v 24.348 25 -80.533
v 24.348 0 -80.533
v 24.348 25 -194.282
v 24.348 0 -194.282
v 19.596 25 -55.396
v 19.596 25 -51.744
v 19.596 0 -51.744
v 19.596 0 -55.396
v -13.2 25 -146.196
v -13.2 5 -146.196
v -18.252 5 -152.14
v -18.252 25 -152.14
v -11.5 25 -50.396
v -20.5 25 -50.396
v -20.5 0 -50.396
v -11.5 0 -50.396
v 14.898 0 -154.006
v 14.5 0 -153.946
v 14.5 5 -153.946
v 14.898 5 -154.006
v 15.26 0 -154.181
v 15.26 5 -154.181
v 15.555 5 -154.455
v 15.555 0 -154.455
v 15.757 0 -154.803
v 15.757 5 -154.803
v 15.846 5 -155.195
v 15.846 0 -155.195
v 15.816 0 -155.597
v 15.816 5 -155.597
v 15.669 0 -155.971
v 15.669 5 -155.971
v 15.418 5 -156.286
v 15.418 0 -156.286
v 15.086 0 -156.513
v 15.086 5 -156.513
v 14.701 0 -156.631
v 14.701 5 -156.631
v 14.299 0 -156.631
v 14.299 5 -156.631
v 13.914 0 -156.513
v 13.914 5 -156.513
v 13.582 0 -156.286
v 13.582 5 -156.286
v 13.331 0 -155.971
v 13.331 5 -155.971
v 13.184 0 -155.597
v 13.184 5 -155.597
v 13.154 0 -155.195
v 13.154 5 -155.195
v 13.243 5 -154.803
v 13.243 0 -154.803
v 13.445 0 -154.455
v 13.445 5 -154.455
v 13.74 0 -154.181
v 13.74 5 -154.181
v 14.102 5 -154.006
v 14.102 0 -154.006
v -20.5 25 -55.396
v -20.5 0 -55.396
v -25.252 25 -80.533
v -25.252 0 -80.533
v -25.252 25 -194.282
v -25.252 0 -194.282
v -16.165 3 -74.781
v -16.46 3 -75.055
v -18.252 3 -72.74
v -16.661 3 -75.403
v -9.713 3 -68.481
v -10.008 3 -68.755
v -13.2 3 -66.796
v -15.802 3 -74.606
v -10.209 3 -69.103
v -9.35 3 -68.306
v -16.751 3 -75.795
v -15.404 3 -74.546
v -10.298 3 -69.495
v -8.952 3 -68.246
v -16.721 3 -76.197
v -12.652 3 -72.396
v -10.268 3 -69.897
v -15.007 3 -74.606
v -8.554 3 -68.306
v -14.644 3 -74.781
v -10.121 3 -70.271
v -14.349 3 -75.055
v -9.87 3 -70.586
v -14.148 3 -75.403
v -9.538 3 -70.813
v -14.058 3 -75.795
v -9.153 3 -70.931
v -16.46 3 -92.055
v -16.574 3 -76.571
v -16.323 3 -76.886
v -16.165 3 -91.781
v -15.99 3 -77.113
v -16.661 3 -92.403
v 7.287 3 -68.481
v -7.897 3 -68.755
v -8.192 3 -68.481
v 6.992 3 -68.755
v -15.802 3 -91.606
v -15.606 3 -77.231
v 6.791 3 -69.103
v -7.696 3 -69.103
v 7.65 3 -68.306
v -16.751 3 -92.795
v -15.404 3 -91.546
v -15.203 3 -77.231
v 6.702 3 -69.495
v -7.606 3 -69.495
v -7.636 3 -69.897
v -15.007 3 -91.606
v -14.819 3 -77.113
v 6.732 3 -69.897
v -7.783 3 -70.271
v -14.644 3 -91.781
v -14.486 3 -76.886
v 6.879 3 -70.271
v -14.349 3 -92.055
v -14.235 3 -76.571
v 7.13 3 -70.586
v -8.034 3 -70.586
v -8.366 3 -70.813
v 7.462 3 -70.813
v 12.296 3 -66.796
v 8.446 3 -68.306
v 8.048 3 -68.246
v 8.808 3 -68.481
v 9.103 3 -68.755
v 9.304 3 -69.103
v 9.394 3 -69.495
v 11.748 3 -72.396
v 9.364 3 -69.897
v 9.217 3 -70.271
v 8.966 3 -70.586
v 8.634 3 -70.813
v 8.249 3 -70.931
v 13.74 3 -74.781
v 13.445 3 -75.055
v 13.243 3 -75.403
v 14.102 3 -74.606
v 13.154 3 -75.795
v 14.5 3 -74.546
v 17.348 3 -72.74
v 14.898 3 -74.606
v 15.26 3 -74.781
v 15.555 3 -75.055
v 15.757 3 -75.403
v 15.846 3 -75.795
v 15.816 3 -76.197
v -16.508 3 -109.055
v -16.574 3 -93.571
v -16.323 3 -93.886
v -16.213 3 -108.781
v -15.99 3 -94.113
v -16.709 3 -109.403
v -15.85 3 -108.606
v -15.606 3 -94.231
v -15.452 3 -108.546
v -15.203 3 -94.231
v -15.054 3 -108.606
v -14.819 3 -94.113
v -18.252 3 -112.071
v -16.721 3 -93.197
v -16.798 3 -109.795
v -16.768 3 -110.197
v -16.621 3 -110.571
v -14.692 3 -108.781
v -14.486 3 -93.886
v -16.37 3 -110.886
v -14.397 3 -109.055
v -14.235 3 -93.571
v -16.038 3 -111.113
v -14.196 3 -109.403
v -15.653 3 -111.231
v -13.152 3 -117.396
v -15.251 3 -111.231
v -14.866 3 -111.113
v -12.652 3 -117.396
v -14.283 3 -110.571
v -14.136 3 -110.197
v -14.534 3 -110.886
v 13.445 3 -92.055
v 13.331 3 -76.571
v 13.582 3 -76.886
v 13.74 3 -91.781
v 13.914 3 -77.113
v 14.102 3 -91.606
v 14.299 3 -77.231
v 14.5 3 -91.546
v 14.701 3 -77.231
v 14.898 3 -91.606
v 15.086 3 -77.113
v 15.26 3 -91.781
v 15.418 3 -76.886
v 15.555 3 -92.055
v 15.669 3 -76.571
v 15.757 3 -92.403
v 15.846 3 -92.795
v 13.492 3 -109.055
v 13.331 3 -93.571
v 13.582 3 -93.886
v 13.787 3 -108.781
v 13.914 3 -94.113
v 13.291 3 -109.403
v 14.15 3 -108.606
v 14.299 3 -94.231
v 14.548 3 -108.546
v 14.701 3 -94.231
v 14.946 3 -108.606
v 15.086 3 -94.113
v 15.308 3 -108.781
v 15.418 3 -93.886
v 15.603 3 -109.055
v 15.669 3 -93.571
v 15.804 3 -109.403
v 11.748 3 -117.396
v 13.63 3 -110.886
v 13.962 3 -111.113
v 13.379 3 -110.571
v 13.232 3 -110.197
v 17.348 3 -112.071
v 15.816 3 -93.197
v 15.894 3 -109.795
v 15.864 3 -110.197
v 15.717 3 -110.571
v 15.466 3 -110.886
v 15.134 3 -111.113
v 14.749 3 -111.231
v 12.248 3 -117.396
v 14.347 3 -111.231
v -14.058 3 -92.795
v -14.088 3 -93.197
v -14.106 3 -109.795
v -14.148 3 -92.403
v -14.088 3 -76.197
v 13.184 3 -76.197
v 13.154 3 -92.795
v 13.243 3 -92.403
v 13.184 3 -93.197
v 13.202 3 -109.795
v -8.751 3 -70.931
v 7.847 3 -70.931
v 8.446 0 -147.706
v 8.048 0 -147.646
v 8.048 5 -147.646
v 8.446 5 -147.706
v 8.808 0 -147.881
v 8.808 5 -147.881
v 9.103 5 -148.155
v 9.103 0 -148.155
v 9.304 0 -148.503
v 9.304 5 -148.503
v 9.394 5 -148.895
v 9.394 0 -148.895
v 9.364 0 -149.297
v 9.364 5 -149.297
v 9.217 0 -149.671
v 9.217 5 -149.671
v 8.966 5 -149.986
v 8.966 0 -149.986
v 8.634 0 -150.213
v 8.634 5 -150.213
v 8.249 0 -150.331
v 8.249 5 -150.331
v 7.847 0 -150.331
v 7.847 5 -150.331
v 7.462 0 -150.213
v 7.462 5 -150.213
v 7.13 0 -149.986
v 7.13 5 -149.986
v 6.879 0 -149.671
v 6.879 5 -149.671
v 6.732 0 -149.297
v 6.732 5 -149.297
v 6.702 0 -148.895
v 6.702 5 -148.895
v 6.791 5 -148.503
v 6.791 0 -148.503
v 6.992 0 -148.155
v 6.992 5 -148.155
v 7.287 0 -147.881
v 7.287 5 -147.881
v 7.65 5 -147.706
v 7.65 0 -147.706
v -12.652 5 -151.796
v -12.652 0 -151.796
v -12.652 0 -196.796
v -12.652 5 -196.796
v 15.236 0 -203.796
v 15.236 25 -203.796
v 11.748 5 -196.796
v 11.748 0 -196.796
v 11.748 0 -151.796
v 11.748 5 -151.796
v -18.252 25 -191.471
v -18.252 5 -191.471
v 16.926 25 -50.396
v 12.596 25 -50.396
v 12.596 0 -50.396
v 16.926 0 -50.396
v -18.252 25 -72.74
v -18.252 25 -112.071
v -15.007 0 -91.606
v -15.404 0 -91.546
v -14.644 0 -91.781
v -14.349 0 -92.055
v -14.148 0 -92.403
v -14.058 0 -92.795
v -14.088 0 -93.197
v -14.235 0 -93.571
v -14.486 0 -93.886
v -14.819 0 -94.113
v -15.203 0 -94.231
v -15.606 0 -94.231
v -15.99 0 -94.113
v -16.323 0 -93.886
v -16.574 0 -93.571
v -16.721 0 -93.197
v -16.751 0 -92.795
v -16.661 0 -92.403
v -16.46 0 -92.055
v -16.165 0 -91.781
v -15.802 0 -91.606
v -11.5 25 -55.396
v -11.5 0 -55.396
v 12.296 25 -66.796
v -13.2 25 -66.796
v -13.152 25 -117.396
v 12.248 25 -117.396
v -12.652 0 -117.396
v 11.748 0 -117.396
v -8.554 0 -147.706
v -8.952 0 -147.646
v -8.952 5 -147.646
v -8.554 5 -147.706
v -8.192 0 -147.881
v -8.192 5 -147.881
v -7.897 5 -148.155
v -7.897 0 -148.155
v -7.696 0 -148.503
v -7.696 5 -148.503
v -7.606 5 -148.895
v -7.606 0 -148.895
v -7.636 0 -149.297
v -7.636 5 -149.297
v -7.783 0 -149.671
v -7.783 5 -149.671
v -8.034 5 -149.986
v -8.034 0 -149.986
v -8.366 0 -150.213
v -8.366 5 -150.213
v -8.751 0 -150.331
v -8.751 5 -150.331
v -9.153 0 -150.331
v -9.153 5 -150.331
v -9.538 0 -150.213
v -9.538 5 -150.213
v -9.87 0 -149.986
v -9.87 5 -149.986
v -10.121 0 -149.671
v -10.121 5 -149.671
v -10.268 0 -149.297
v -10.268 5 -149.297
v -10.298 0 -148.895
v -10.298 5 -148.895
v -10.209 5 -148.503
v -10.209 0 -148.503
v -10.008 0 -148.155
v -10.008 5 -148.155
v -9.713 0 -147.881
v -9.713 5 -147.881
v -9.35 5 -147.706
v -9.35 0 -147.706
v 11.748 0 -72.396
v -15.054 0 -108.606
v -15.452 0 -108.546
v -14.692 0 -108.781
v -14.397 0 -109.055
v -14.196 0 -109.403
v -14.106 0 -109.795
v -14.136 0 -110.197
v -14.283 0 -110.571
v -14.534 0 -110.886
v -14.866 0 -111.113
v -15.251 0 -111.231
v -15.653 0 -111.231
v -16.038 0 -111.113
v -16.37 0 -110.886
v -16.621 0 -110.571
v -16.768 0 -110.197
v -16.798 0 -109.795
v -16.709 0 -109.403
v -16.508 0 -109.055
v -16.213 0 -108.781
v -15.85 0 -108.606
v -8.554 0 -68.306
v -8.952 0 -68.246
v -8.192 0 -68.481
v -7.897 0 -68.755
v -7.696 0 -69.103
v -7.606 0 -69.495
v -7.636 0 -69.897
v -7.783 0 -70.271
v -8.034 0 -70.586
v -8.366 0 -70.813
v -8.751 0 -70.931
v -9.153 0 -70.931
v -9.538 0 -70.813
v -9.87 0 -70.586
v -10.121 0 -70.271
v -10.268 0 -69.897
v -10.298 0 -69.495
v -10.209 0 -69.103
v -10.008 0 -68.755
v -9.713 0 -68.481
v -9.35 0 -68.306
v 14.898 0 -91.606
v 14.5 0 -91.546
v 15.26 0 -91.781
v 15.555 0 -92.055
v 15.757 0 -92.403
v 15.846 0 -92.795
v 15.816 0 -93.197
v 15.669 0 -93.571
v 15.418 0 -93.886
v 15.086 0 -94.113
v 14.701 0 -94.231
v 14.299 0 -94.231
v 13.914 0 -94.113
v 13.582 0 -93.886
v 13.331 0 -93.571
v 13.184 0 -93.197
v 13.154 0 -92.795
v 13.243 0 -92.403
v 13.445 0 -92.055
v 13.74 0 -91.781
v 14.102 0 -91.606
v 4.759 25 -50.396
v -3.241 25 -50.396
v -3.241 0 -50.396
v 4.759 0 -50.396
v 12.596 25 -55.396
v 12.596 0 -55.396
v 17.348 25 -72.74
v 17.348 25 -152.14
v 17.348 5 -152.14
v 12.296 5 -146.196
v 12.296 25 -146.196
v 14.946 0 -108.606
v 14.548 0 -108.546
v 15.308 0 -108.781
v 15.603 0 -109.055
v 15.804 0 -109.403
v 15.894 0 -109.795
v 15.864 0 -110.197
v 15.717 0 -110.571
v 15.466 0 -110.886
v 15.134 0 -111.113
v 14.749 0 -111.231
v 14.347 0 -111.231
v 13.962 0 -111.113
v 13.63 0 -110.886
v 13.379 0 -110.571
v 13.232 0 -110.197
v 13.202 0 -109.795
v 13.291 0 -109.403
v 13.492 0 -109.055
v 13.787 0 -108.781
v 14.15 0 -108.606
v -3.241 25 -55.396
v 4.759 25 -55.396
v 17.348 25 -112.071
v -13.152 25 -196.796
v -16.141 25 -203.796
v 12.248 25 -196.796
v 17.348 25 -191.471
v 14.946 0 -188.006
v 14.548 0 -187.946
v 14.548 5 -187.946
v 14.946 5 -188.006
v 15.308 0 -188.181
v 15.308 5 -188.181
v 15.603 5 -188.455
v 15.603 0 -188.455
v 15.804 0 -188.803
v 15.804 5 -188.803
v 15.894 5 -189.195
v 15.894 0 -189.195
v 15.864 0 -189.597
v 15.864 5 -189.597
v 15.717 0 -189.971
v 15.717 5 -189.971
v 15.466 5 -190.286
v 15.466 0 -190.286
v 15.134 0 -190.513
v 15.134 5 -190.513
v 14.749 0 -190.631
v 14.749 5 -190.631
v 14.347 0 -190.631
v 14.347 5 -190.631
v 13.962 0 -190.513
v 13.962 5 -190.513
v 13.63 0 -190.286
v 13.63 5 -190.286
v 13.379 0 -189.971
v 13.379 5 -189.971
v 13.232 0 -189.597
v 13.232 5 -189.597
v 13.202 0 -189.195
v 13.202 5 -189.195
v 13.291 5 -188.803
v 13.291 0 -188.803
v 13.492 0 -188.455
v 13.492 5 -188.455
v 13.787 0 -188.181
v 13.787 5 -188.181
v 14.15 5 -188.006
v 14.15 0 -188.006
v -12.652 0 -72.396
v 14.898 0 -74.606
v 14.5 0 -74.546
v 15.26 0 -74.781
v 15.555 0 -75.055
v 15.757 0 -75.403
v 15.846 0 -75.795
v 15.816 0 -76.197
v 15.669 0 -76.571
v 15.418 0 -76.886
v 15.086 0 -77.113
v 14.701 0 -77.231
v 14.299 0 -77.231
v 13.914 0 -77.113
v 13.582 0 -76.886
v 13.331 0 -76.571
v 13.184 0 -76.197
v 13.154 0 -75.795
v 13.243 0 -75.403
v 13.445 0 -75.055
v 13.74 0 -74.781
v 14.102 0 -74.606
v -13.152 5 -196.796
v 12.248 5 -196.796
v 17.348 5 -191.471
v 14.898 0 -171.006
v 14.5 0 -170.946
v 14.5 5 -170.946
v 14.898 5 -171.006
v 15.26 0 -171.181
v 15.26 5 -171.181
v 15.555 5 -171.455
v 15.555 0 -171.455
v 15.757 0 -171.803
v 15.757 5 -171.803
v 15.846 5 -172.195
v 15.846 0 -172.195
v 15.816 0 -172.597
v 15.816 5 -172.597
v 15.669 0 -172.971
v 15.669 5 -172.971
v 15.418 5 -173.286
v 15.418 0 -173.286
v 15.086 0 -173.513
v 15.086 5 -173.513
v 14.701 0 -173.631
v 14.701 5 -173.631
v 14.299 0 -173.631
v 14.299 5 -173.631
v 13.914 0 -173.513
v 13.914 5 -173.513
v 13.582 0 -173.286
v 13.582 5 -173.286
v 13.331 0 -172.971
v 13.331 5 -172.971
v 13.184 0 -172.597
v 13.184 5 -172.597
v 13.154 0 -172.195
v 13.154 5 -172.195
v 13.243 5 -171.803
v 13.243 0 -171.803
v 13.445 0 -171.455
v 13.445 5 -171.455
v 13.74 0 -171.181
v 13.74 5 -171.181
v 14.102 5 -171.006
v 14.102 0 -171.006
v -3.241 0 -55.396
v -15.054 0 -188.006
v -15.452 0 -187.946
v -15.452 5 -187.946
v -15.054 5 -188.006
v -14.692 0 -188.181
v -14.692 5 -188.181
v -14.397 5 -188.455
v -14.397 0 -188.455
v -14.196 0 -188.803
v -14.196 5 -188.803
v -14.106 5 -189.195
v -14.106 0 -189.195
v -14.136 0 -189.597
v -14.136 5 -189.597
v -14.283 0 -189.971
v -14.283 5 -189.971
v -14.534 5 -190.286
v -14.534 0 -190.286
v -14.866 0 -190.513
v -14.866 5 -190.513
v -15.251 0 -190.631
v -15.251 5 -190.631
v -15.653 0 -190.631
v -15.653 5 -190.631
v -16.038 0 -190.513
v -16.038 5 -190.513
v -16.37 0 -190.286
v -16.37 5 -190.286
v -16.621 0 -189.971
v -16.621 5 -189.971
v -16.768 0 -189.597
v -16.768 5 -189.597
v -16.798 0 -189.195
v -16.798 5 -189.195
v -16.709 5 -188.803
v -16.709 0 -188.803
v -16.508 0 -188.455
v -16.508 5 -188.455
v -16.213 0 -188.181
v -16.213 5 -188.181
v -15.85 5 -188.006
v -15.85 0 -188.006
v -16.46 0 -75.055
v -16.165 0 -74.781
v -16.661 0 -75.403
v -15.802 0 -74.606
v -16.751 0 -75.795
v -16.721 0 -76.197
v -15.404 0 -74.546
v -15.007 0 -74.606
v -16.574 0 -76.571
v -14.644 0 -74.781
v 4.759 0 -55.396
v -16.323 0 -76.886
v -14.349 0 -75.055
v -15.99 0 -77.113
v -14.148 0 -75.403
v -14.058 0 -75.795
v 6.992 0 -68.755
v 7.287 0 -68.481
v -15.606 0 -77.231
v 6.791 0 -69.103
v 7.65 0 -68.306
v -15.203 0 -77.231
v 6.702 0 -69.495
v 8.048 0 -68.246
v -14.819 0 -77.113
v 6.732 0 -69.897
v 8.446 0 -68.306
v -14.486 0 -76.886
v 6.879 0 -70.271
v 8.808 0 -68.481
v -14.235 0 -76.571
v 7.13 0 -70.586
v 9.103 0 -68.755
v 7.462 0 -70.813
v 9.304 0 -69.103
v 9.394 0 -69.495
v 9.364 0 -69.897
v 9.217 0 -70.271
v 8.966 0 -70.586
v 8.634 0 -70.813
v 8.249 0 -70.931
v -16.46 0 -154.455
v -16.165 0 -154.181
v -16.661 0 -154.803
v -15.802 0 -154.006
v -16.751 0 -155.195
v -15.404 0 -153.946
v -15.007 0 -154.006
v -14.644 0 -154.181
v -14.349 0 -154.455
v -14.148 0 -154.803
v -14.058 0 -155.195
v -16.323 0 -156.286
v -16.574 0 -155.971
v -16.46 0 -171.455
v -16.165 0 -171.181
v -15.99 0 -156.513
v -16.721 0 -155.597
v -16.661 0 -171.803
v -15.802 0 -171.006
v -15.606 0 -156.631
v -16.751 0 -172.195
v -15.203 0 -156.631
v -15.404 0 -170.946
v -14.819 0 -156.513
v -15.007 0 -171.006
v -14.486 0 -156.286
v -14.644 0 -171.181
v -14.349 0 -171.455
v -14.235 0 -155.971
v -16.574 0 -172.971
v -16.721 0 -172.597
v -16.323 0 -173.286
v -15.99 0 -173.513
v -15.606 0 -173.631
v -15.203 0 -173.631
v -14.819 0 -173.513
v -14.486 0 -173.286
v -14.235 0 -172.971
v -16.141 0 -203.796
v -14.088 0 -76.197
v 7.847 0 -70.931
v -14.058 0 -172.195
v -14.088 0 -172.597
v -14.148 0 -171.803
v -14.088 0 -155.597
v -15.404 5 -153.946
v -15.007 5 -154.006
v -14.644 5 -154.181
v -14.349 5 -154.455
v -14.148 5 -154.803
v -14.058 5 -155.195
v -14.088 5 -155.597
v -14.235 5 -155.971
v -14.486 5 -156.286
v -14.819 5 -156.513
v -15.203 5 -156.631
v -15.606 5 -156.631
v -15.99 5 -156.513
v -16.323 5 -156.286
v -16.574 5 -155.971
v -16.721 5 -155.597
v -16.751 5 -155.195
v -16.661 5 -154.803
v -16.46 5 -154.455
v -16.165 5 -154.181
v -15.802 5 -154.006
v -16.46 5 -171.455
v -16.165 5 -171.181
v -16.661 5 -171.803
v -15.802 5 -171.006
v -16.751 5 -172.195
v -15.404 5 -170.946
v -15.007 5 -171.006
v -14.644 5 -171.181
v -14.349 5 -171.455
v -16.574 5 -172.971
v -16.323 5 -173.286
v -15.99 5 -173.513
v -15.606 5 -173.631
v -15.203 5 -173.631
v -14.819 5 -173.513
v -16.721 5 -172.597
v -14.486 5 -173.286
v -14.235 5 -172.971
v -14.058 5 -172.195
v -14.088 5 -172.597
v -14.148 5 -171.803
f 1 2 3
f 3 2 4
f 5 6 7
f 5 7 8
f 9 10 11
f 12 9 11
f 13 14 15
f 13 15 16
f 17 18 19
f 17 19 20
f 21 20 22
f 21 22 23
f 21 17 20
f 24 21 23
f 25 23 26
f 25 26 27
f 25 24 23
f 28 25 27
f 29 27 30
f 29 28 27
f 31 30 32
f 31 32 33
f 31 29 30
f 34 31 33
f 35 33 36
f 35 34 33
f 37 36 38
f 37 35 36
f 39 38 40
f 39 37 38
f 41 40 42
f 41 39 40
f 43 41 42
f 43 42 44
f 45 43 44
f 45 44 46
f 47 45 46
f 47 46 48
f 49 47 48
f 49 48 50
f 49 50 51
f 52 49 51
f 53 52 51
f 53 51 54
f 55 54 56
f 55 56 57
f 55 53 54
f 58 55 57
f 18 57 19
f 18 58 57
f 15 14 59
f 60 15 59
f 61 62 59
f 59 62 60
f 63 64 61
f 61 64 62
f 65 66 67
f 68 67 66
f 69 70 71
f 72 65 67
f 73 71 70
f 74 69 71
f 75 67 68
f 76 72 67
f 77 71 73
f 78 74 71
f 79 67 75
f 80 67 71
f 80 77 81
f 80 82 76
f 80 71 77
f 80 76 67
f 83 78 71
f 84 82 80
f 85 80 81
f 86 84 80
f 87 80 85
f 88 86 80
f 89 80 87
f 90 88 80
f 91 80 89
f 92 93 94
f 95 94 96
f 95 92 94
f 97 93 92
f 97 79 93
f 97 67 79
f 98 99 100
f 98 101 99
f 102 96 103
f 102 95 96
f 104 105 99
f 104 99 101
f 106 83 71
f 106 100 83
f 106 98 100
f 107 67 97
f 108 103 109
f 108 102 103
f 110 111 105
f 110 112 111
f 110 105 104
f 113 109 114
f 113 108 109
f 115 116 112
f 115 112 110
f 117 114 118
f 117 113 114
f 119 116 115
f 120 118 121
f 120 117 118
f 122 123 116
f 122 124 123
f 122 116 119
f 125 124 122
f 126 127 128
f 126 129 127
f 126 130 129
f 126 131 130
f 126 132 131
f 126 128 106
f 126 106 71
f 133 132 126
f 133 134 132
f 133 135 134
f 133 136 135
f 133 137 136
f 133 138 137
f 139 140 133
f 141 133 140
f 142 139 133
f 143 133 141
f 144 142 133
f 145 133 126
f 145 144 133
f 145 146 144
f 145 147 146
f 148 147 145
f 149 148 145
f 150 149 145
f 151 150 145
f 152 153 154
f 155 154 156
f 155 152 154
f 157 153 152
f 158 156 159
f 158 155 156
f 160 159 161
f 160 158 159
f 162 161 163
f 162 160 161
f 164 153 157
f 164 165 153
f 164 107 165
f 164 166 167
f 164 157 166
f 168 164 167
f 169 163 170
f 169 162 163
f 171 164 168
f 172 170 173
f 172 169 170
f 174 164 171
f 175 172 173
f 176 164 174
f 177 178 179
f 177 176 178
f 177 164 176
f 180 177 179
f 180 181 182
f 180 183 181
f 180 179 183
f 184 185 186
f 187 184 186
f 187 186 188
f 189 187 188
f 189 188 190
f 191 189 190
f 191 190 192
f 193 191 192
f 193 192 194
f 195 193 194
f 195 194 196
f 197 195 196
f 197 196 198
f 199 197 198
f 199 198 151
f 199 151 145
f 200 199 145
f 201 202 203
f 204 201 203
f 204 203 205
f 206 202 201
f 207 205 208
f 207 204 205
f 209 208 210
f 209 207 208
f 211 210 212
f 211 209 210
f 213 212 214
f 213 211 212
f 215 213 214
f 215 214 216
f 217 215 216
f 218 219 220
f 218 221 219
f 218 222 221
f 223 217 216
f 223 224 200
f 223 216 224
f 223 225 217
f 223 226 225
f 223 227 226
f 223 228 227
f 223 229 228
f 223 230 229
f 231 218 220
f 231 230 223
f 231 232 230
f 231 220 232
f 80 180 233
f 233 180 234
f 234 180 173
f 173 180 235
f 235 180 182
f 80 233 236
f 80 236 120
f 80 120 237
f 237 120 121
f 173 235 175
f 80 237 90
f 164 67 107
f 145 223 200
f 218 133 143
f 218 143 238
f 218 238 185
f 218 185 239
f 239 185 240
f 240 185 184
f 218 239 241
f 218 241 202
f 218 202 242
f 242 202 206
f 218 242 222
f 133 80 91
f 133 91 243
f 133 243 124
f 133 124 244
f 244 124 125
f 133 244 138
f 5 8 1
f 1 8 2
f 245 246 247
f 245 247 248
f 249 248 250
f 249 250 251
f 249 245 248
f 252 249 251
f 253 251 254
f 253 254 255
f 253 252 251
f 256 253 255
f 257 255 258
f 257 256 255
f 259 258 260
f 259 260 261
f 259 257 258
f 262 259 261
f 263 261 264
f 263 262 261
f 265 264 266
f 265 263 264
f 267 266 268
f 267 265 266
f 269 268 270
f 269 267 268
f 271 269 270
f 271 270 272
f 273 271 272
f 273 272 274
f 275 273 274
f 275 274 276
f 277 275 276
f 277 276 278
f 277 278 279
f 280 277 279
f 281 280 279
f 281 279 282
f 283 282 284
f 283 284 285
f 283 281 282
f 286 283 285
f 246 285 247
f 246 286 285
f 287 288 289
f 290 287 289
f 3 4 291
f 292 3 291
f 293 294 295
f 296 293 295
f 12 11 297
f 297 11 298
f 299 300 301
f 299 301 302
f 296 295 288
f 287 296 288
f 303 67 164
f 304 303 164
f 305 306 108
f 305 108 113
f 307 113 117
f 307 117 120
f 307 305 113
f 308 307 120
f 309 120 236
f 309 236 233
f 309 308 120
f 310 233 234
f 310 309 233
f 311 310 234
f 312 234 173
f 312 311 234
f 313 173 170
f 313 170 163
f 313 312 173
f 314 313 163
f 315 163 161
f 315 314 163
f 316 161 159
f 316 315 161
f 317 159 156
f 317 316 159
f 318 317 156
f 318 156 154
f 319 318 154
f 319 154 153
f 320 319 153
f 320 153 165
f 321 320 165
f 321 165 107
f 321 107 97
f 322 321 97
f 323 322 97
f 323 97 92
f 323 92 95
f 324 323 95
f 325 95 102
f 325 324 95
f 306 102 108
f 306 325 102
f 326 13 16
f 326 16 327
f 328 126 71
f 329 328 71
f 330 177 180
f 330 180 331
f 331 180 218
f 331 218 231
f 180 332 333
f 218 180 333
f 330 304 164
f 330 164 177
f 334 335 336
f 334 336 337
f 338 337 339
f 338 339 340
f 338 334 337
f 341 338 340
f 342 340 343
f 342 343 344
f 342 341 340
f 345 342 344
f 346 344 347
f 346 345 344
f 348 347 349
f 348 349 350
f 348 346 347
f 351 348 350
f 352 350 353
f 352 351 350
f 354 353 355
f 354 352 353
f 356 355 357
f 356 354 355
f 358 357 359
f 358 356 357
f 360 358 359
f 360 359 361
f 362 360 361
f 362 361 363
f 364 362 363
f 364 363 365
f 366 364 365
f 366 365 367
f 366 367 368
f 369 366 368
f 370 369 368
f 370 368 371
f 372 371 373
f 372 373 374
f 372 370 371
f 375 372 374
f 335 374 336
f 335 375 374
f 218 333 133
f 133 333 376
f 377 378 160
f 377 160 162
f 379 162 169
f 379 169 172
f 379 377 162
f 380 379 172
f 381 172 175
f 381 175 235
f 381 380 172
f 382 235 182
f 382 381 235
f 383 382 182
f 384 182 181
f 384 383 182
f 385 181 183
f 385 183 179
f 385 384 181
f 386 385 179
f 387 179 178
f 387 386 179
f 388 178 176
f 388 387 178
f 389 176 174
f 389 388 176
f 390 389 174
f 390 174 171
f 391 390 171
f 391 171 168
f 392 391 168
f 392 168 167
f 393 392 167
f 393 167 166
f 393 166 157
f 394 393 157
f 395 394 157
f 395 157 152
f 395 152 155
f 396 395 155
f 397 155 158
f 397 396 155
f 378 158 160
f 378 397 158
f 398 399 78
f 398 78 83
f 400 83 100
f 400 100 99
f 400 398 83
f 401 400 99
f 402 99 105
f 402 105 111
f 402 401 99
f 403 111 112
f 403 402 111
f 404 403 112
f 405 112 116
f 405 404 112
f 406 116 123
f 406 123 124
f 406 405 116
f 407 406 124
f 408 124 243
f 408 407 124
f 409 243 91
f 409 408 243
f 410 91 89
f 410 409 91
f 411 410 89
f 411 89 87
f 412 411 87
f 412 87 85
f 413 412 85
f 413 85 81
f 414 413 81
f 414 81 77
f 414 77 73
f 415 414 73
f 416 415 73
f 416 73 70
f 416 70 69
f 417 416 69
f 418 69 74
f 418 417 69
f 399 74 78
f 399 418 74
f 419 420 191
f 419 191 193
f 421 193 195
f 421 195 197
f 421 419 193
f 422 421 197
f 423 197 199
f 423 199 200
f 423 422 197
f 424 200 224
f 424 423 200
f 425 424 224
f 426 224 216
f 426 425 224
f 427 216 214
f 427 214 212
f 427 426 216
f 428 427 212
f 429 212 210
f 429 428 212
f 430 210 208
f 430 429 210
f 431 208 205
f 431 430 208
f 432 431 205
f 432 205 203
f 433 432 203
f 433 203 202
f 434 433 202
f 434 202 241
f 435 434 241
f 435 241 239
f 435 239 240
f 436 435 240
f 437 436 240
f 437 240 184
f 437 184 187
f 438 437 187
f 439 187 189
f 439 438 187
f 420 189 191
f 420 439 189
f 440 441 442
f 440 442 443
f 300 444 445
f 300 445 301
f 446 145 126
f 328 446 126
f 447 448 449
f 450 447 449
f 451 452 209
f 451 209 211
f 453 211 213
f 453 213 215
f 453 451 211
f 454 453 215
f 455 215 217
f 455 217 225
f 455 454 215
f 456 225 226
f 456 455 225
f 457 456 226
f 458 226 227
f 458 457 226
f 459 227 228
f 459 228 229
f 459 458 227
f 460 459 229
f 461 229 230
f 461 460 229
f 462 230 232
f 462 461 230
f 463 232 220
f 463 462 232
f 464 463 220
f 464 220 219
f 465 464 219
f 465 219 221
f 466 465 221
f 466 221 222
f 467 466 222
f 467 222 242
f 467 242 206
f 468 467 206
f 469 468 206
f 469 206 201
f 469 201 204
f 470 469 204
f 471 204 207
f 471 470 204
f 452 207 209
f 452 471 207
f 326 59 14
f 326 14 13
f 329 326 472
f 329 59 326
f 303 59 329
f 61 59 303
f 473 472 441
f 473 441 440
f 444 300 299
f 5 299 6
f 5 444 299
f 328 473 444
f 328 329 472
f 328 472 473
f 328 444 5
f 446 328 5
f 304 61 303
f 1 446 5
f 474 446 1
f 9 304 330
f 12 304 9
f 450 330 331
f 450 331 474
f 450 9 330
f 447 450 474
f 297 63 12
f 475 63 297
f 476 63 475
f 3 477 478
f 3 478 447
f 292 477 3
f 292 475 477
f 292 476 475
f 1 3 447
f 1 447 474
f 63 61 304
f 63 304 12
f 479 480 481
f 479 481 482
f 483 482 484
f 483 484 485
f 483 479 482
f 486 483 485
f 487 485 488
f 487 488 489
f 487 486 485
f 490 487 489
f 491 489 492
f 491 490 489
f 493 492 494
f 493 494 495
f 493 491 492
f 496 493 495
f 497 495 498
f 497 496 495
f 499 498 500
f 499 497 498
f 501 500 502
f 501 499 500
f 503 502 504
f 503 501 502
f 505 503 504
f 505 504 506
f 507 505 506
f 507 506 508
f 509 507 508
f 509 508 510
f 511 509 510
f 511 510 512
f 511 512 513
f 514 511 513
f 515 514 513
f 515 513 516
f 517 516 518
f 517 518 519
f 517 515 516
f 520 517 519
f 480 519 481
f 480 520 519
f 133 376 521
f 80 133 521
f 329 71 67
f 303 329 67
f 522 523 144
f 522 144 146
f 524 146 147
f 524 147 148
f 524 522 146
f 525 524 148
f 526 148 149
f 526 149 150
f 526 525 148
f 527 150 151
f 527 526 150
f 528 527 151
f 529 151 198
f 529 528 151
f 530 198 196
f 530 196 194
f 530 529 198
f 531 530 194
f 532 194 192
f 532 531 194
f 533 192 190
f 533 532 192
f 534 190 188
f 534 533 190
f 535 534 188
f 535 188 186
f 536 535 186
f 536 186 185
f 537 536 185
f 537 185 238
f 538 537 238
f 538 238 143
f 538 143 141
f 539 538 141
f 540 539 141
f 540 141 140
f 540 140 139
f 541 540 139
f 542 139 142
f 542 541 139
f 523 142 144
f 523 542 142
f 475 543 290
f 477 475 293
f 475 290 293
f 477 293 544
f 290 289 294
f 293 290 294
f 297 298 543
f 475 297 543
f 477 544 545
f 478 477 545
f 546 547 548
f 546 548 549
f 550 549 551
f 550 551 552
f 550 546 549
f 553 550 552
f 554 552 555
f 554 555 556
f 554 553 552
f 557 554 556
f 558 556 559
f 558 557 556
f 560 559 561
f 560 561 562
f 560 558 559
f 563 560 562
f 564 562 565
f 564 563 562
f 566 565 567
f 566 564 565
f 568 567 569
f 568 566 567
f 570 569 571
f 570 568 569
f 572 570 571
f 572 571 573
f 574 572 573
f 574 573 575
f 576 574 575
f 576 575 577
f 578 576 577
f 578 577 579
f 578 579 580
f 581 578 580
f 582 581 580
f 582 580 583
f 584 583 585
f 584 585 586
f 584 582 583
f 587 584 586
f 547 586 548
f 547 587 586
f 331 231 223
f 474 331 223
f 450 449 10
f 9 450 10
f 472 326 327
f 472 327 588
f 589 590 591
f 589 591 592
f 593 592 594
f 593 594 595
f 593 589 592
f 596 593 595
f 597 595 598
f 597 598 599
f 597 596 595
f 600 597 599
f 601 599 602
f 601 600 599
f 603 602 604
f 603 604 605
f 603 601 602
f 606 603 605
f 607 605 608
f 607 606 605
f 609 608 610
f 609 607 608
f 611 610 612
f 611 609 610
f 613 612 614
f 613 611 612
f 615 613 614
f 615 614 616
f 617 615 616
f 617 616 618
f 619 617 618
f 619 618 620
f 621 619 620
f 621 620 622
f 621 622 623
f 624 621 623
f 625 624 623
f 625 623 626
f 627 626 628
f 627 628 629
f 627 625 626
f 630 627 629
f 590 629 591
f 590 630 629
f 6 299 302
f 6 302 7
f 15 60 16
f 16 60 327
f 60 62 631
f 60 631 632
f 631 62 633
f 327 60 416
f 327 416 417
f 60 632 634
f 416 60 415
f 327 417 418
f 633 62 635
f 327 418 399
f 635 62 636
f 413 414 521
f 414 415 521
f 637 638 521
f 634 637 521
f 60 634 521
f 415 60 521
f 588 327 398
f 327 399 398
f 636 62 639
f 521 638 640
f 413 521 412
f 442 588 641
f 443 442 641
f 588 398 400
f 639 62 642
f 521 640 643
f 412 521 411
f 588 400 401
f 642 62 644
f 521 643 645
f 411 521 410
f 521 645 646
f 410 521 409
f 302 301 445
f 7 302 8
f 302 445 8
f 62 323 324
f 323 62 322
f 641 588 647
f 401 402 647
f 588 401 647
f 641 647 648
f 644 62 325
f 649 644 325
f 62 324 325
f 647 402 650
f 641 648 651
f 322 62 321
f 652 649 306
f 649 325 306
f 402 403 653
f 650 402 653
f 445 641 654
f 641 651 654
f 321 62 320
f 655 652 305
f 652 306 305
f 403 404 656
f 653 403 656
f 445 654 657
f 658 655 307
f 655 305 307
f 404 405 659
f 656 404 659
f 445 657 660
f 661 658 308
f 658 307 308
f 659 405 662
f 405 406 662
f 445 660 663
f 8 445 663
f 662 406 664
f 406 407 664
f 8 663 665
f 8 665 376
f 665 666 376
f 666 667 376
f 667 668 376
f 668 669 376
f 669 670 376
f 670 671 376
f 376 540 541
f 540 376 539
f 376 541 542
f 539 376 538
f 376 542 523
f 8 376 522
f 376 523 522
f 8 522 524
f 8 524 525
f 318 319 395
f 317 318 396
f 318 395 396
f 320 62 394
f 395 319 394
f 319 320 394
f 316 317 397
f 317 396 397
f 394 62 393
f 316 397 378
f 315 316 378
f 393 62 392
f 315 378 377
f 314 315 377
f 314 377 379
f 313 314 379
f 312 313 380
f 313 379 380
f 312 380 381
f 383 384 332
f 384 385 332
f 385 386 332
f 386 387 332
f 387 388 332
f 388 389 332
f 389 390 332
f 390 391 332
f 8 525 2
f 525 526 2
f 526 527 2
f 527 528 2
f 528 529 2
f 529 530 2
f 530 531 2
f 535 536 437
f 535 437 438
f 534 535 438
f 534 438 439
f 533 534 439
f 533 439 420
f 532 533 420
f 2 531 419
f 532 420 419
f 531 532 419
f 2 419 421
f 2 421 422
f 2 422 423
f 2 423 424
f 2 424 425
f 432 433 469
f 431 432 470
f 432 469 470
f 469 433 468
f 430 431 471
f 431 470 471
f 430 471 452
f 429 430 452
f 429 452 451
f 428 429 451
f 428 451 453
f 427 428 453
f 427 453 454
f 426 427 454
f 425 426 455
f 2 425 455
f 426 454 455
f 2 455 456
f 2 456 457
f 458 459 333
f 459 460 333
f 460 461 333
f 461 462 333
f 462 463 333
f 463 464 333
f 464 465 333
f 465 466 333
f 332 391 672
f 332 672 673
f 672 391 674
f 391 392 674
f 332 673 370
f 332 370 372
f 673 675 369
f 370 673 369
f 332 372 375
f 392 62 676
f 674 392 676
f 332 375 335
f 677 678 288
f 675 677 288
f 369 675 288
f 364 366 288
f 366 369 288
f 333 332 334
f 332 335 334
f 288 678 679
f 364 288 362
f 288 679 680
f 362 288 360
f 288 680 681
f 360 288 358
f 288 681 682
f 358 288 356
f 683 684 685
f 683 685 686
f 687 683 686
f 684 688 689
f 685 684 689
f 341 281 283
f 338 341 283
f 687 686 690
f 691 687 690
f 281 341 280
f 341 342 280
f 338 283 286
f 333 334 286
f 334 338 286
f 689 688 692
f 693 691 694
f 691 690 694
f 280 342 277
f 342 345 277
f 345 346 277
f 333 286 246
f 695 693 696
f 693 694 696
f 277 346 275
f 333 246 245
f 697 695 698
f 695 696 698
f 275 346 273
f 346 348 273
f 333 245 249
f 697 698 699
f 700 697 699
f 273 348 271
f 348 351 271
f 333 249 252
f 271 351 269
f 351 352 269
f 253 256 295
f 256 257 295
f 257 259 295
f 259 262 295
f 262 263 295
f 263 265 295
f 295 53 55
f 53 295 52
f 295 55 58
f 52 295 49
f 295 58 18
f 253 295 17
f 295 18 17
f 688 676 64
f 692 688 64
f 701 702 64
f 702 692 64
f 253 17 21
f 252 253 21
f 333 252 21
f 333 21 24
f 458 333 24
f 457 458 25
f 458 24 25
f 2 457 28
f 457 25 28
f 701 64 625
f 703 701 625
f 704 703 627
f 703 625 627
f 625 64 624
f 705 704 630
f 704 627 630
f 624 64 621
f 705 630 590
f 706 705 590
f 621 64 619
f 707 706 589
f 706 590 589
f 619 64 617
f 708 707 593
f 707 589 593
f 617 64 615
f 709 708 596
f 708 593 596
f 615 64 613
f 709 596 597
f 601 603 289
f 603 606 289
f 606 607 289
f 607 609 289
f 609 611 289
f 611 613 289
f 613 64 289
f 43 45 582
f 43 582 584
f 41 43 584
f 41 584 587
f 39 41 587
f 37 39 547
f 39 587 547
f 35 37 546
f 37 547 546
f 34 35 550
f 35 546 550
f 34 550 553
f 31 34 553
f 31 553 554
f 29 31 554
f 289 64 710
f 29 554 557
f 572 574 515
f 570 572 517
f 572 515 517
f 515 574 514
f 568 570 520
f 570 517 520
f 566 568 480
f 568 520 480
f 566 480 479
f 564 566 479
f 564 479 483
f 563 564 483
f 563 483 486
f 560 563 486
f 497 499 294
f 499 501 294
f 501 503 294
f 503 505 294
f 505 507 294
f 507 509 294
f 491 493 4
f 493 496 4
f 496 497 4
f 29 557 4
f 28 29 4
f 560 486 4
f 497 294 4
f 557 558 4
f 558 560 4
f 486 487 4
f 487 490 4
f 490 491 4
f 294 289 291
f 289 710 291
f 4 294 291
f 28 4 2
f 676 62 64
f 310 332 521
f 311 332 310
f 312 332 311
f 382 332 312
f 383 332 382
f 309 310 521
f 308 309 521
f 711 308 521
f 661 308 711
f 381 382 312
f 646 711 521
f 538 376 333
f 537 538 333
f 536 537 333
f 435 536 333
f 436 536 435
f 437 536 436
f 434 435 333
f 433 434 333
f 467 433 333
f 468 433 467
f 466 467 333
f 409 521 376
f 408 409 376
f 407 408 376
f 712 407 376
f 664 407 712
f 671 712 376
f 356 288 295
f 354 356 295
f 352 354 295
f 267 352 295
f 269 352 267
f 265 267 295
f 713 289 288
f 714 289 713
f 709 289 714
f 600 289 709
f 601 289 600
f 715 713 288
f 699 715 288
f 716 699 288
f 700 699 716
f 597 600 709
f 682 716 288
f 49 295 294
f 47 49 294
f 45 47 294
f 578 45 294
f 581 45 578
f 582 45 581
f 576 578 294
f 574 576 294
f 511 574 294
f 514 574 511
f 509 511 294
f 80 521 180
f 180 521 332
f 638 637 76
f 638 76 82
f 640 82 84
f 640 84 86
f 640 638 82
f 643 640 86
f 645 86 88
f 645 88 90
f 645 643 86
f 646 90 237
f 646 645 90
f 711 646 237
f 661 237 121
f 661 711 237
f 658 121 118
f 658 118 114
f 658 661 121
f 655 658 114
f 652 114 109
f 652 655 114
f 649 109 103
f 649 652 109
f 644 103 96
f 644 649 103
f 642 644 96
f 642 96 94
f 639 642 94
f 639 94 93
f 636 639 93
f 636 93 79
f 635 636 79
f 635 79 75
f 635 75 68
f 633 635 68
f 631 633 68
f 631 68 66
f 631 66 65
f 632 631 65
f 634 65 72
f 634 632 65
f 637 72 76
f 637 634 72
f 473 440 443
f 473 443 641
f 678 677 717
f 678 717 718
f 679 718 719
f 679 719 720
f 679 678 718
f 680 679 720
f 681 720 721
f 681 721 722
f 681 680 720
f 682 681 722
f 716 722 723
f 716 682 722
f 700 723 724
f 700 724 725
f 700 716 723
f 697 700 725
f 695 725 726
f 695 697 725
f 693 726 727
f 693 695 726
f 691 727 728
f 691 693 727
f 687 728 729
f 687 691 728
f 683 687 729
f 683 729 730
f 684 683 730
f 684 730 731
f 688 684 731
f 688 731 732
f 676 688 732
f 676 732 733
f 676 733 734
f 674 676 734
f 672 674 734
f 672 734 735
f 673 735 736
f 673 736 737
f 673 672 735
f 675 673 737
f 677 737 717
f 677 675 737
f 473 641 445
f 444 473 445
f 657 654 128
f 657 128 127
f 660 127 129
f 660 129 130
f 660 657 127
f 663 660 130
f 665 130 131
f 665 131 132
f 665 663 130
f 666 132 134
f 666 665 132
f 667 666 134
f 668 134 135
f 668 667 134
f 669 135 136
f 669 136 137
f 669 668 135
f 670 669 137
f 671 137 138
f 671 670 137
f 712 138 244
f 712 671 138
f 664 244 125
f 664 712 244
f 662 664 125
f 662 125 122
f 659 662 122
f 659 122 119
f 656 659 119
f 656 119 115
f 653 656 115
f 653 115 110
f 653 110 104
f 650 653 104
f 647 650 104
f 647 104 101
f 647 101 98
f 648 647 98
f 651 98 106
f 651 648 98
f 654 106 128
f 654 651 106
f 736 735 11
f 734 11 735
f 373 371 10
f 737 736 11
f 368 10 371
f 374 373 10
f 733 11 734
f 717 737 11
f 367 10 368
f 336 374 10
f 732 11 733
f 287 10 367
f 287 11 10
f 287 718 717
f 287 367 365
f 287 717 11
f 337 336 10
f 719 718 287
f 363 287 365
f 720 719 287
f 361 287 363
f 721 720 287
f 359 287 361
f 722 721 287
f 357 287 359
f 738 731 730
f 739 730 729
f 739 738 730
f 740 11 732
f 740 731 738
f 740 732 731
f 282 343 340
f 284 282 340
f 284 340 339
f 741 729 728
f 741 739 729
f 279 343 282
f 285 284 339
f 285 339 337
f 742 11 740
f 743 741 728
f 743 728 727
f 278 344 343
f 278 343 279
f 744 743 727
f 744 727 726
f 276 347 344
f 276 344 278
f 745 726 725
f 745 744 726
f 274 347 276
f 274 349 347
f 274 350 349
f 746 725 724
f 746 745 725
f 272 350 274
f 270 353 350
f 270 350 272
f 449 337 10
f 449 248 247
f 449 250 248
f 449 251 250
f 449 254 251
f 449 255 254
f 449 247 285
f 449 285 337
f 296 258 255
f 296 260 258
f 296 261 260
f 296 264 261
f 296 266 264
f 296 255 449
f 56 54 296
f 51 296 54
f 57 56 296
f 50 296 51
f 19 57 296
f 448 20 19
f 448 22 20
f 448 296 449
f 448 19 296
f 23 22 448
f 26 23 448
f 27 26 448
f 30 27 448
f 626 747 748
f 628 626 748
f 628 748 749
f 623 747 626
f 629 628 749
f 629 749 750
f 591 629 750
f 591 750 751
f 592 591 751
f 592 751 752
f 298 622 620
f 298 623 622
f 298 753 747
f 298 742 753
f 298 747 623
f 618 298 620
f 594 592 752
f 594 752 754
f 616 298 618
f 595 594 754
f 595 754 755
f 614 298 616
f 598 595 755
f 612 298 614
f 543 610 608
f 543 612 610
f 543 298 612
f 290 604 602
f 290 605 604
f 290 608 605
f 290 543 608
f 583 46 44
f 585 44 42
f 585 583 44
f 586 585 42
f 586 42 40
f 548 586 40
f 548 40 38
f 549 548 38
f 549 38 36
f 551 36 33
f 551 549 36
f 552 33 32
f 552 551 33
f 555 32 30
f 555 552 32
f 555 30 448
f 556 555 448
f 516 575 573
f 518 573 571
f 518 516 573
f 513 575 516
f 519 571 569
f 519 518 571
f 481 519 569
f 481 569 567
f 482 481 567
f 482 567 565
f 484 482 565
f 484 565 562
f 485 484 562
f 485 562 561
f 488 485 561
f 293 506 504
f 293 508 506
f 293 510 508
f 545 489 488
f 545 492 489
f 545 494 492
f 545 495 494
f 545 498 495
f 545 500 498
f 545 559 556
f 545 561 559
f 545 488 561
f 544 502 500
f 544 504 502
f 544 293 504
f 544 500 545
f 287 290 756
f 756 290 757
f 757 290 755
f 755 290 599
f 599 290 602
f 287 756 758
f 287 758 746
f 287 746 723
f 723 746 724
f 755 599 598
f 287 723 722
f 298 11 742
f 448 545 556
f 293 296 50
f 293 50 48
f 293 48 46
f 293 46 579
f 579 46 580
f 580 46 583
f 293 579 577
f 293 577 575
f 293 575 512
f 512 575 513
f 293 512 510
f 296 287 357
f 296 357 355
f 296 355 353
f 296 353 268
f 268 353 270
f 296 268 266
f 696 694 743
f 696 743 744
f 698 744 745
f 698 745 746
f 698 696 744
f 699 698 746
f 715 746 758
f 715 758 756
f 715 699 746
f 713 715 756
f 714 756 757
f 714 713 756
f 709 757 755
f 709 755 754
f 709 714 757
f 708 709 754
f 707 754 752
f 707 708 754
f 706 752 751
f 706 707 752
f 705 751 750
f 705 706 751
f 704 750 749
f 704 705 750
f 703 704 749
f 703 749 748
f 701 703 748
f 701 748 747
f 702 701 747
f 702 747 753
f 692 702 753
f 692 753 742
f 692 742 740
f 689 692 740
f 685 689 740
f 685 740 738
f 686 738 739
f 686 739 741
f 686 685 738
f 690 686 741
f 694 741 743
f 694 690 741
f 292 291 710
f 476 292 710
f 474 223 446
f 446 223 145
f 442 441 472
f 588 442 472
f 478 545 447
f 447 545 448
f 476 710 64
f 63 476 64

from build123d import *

# Parameters (mm, degrees)
SZKIC1_W                    = 24.4
SZKIC1_H                    = 45
SZKIC1_R                    = 1.35
DODANIE_WYCI_GNI_CIE1_DEPTH = 5
DODANIE_WYCI_GNI_CIE2_DEPTH = 25
SZKIC8_W                    = 8
SZKIC8_H                    = 5
SZKIC8_W_2                  = 9
DODANIE_WYCI_GNI_CIE3_DEPTH = 25
SZKIC1_4_R                  = 1.35
DODANIE_WYCI_GNI_CIE4_DEPTH = 3


with BuildPart() as part:
    # Szkic1 → Dodanie-wyci_gni_cie1 (new body)
    with BuildSketch(Plane(origin=(0, 0, 0), x_dir=(1, 0, 0), z_dir=(0, 1, 0))):
        Polygon((-25.252210447, 194.281753518), (-25.252210447, 80.533497461), (-20.5, 55.3963255), (19.595579106, 55.3963255), (24.347789553, 80.533497461), (24.347789553, 194.281753518), (15.236444388, 203.7963255), (-16.140865282, 203.7963255), align=None)
        with Locations((-0.452210447, 174.2963255)):
            Rectangle(SZKIC1_W, SZKIC1_H, mode=Mode.SUBTRACT)
        with Locations((-15.404420894, 155.2963255)):
            Circle(SZKIC1_R, mode=Mode.SUBTRACT)
        with Locations((-8.952210447, 148.9963255)):
            Circle(SZKIC1_R, mode=Mode.SUBTRACT)
        with Locations((-15.404420894, 172.2963255)):
            Circle(SZKIC1_R, mode=Mode.SUBTRACT)
        with Locations((-15.452210447, 189.2963255)):
            Circle(SZKIC1_R, mode=Mode.SUBTRACT)
        with Locations((8.047789553, 148.9963255)):
            Circle(SZKIC1_R, mode=Mode.SUBTRACT)
        with Locations((14.5, 155.2963255)):
            Circle(SZKIC1_R, mode=Mode.SUBTRACT)
        with Locations((14.5, 172.2963255)):
            Circle(SZKIC1_R, mode=Mode.SUBTRACT)
        with Locations((14.547789553, 189.2963255)):
            Circle(SZKIC1_R, mode=Mode.SUBTRACT)
        Polygon((12.247789553, 117.3963255), (17.347789553, 112.070622628), (17.347789553, 72.740102496), (12.295579106, 66.7963255), (-13.2, 66.7963255), (-18.252210447, 72.740102496), (-18.252210447, 112.070622628), (-13.152210447, 117.3963255), align=None, mode=Mode.SUBTRACT)
    extrude(amount=DODANIE_WYCI_GNI_CIE1_DEPTH)

    # Szkic1_3 → Dodanie-wyci_gni_cie2 (add)
    with BuildSketch(Plane(origin=(0, 0, 0), x_dir=(1, 0, 0), z_dir=(0, 1, 0))):
        Polygon((-20.5, 55.3963255), (19.595579106, 55.3963255), (24.347789553, 80.533497461), (24.347789553, 194.281753518), (15.236444388, 203.7963255), (-16.140865282, 203.7963255), (-25.252210447, 194.281753518), (-25.252210447, 80.533497461), align=None)
        Polygon((-13.152210447, 117.3963255), (12.247789553, 117.3963255), (17.347789553, 112.070622628), (17.347789553, 72.740102496), (12.295579106, 66.7963255), (-13.2, 66.7963255), (-18.252210447, 72.740102496), (-18.252210447, 112.070622628), align=None, mode=Mode.SUBTRACT)
        Polygon((12.247789553, 196.7963255), (17.347789553, 191.470622628), (17.347789553, 152.140102496), (12.295579106, 146.1963255), (-13.2, 146.1963255), (-18.252210447, 152.140102496), (-18.252210447, 191.470622628), (-13.152210447, 196.7963255), align=None, mode=Mode.SUBTRACT)
    extrude(amount=DODANIE_WYCI_GNI_CIE2_DEPTH)

    # Szkic8 → Dodanie-wyci_gni_cie3 (add)
    with BuildSketch(Plane(origin=(0, 25, 0), x_dir=(1, 0, 0), z_dir=(0, 1, 0))):
        Polygon((19.595579106, 51.744454691), (19.595579106, 55.3963255), (12.595579106, 55.3963255), (12.595579106, 50.3963255), (16.925579106, 50.3963255), align=None)
        with Locations((0.758846465, 52.8963255)):
            Rectangle(SZKIC8_W, SZKIC8_H)
        with Locations((-16, 52.8963255)):
            Rectangle(SZKIC8_W_2, SZKIC8_H)
    extrude(amount=-DODANIE_WYCI_GNI_CIE3_DEPTH)

    # Szkic1_4 → Dodanie-wyci_gni_cie4 (add)
    with BuildSketch(Plane(origin=(0, 0, 0), x_dir=(1, 0, 0), z_dir=(0, 1, 0))):
        Polygon((-12.652210447, 72.3963255), (-12.652210447, 117.3963255), (-13.152210447, 117.3963255), (-18.252210447, 112.070622628), (-18.252210447, 72.740102496), (-13.2, 66.7963255), (12.295579106, 66.7963255), (17.347789553, 72.740102496), (17.347789553, 112.070622628), (12.247789553, 117.3963255), (11.747789553, 117.3963255), (11.747789553, 72.3963255), align=None)
        with Locations((-15.404420894, 75.8963255)):
            Circle(SZKIC1_4_R, mode=Mode.SUBTRACT)
        with Locations((-8.952210447, 69.5963255)):
            Circle(SZKIC1_4_R, mode=Mode.SUBTRACT)
        with Locations((-15.404420894, 92.8963255)):
            Circle(SZKIC1_4_R, mode=Mode.SUBTRACT)
        with Locations((-15.452210447, 109.8963255)):
            Circle(SZKIC1_4_R, mode=Mode.SUBTRACT)
        with Locations((8.047789553, 69.5963255)):
            Circle(SZKIC1_4_R, mode=Mode.SUBTRACT)
        with Locations((14.5, 75.8963255)):
            Circle(SZKIC1_4_R, mode=Mode.SUBTRACT)
        with Locations((14.5, 92.8963255)):
            Circle(SZKIC1_4_R, mode=Mode.SUBTRACT)
        with Locations((14.547789553, 109.8963255)):
            Circle(SZKIC1_4_R, mode=Mode.SUBTRACT)
    extrude(amount=DODANIE_WYCI_GNI_CIE4_DEPTH)


solid = part.part
